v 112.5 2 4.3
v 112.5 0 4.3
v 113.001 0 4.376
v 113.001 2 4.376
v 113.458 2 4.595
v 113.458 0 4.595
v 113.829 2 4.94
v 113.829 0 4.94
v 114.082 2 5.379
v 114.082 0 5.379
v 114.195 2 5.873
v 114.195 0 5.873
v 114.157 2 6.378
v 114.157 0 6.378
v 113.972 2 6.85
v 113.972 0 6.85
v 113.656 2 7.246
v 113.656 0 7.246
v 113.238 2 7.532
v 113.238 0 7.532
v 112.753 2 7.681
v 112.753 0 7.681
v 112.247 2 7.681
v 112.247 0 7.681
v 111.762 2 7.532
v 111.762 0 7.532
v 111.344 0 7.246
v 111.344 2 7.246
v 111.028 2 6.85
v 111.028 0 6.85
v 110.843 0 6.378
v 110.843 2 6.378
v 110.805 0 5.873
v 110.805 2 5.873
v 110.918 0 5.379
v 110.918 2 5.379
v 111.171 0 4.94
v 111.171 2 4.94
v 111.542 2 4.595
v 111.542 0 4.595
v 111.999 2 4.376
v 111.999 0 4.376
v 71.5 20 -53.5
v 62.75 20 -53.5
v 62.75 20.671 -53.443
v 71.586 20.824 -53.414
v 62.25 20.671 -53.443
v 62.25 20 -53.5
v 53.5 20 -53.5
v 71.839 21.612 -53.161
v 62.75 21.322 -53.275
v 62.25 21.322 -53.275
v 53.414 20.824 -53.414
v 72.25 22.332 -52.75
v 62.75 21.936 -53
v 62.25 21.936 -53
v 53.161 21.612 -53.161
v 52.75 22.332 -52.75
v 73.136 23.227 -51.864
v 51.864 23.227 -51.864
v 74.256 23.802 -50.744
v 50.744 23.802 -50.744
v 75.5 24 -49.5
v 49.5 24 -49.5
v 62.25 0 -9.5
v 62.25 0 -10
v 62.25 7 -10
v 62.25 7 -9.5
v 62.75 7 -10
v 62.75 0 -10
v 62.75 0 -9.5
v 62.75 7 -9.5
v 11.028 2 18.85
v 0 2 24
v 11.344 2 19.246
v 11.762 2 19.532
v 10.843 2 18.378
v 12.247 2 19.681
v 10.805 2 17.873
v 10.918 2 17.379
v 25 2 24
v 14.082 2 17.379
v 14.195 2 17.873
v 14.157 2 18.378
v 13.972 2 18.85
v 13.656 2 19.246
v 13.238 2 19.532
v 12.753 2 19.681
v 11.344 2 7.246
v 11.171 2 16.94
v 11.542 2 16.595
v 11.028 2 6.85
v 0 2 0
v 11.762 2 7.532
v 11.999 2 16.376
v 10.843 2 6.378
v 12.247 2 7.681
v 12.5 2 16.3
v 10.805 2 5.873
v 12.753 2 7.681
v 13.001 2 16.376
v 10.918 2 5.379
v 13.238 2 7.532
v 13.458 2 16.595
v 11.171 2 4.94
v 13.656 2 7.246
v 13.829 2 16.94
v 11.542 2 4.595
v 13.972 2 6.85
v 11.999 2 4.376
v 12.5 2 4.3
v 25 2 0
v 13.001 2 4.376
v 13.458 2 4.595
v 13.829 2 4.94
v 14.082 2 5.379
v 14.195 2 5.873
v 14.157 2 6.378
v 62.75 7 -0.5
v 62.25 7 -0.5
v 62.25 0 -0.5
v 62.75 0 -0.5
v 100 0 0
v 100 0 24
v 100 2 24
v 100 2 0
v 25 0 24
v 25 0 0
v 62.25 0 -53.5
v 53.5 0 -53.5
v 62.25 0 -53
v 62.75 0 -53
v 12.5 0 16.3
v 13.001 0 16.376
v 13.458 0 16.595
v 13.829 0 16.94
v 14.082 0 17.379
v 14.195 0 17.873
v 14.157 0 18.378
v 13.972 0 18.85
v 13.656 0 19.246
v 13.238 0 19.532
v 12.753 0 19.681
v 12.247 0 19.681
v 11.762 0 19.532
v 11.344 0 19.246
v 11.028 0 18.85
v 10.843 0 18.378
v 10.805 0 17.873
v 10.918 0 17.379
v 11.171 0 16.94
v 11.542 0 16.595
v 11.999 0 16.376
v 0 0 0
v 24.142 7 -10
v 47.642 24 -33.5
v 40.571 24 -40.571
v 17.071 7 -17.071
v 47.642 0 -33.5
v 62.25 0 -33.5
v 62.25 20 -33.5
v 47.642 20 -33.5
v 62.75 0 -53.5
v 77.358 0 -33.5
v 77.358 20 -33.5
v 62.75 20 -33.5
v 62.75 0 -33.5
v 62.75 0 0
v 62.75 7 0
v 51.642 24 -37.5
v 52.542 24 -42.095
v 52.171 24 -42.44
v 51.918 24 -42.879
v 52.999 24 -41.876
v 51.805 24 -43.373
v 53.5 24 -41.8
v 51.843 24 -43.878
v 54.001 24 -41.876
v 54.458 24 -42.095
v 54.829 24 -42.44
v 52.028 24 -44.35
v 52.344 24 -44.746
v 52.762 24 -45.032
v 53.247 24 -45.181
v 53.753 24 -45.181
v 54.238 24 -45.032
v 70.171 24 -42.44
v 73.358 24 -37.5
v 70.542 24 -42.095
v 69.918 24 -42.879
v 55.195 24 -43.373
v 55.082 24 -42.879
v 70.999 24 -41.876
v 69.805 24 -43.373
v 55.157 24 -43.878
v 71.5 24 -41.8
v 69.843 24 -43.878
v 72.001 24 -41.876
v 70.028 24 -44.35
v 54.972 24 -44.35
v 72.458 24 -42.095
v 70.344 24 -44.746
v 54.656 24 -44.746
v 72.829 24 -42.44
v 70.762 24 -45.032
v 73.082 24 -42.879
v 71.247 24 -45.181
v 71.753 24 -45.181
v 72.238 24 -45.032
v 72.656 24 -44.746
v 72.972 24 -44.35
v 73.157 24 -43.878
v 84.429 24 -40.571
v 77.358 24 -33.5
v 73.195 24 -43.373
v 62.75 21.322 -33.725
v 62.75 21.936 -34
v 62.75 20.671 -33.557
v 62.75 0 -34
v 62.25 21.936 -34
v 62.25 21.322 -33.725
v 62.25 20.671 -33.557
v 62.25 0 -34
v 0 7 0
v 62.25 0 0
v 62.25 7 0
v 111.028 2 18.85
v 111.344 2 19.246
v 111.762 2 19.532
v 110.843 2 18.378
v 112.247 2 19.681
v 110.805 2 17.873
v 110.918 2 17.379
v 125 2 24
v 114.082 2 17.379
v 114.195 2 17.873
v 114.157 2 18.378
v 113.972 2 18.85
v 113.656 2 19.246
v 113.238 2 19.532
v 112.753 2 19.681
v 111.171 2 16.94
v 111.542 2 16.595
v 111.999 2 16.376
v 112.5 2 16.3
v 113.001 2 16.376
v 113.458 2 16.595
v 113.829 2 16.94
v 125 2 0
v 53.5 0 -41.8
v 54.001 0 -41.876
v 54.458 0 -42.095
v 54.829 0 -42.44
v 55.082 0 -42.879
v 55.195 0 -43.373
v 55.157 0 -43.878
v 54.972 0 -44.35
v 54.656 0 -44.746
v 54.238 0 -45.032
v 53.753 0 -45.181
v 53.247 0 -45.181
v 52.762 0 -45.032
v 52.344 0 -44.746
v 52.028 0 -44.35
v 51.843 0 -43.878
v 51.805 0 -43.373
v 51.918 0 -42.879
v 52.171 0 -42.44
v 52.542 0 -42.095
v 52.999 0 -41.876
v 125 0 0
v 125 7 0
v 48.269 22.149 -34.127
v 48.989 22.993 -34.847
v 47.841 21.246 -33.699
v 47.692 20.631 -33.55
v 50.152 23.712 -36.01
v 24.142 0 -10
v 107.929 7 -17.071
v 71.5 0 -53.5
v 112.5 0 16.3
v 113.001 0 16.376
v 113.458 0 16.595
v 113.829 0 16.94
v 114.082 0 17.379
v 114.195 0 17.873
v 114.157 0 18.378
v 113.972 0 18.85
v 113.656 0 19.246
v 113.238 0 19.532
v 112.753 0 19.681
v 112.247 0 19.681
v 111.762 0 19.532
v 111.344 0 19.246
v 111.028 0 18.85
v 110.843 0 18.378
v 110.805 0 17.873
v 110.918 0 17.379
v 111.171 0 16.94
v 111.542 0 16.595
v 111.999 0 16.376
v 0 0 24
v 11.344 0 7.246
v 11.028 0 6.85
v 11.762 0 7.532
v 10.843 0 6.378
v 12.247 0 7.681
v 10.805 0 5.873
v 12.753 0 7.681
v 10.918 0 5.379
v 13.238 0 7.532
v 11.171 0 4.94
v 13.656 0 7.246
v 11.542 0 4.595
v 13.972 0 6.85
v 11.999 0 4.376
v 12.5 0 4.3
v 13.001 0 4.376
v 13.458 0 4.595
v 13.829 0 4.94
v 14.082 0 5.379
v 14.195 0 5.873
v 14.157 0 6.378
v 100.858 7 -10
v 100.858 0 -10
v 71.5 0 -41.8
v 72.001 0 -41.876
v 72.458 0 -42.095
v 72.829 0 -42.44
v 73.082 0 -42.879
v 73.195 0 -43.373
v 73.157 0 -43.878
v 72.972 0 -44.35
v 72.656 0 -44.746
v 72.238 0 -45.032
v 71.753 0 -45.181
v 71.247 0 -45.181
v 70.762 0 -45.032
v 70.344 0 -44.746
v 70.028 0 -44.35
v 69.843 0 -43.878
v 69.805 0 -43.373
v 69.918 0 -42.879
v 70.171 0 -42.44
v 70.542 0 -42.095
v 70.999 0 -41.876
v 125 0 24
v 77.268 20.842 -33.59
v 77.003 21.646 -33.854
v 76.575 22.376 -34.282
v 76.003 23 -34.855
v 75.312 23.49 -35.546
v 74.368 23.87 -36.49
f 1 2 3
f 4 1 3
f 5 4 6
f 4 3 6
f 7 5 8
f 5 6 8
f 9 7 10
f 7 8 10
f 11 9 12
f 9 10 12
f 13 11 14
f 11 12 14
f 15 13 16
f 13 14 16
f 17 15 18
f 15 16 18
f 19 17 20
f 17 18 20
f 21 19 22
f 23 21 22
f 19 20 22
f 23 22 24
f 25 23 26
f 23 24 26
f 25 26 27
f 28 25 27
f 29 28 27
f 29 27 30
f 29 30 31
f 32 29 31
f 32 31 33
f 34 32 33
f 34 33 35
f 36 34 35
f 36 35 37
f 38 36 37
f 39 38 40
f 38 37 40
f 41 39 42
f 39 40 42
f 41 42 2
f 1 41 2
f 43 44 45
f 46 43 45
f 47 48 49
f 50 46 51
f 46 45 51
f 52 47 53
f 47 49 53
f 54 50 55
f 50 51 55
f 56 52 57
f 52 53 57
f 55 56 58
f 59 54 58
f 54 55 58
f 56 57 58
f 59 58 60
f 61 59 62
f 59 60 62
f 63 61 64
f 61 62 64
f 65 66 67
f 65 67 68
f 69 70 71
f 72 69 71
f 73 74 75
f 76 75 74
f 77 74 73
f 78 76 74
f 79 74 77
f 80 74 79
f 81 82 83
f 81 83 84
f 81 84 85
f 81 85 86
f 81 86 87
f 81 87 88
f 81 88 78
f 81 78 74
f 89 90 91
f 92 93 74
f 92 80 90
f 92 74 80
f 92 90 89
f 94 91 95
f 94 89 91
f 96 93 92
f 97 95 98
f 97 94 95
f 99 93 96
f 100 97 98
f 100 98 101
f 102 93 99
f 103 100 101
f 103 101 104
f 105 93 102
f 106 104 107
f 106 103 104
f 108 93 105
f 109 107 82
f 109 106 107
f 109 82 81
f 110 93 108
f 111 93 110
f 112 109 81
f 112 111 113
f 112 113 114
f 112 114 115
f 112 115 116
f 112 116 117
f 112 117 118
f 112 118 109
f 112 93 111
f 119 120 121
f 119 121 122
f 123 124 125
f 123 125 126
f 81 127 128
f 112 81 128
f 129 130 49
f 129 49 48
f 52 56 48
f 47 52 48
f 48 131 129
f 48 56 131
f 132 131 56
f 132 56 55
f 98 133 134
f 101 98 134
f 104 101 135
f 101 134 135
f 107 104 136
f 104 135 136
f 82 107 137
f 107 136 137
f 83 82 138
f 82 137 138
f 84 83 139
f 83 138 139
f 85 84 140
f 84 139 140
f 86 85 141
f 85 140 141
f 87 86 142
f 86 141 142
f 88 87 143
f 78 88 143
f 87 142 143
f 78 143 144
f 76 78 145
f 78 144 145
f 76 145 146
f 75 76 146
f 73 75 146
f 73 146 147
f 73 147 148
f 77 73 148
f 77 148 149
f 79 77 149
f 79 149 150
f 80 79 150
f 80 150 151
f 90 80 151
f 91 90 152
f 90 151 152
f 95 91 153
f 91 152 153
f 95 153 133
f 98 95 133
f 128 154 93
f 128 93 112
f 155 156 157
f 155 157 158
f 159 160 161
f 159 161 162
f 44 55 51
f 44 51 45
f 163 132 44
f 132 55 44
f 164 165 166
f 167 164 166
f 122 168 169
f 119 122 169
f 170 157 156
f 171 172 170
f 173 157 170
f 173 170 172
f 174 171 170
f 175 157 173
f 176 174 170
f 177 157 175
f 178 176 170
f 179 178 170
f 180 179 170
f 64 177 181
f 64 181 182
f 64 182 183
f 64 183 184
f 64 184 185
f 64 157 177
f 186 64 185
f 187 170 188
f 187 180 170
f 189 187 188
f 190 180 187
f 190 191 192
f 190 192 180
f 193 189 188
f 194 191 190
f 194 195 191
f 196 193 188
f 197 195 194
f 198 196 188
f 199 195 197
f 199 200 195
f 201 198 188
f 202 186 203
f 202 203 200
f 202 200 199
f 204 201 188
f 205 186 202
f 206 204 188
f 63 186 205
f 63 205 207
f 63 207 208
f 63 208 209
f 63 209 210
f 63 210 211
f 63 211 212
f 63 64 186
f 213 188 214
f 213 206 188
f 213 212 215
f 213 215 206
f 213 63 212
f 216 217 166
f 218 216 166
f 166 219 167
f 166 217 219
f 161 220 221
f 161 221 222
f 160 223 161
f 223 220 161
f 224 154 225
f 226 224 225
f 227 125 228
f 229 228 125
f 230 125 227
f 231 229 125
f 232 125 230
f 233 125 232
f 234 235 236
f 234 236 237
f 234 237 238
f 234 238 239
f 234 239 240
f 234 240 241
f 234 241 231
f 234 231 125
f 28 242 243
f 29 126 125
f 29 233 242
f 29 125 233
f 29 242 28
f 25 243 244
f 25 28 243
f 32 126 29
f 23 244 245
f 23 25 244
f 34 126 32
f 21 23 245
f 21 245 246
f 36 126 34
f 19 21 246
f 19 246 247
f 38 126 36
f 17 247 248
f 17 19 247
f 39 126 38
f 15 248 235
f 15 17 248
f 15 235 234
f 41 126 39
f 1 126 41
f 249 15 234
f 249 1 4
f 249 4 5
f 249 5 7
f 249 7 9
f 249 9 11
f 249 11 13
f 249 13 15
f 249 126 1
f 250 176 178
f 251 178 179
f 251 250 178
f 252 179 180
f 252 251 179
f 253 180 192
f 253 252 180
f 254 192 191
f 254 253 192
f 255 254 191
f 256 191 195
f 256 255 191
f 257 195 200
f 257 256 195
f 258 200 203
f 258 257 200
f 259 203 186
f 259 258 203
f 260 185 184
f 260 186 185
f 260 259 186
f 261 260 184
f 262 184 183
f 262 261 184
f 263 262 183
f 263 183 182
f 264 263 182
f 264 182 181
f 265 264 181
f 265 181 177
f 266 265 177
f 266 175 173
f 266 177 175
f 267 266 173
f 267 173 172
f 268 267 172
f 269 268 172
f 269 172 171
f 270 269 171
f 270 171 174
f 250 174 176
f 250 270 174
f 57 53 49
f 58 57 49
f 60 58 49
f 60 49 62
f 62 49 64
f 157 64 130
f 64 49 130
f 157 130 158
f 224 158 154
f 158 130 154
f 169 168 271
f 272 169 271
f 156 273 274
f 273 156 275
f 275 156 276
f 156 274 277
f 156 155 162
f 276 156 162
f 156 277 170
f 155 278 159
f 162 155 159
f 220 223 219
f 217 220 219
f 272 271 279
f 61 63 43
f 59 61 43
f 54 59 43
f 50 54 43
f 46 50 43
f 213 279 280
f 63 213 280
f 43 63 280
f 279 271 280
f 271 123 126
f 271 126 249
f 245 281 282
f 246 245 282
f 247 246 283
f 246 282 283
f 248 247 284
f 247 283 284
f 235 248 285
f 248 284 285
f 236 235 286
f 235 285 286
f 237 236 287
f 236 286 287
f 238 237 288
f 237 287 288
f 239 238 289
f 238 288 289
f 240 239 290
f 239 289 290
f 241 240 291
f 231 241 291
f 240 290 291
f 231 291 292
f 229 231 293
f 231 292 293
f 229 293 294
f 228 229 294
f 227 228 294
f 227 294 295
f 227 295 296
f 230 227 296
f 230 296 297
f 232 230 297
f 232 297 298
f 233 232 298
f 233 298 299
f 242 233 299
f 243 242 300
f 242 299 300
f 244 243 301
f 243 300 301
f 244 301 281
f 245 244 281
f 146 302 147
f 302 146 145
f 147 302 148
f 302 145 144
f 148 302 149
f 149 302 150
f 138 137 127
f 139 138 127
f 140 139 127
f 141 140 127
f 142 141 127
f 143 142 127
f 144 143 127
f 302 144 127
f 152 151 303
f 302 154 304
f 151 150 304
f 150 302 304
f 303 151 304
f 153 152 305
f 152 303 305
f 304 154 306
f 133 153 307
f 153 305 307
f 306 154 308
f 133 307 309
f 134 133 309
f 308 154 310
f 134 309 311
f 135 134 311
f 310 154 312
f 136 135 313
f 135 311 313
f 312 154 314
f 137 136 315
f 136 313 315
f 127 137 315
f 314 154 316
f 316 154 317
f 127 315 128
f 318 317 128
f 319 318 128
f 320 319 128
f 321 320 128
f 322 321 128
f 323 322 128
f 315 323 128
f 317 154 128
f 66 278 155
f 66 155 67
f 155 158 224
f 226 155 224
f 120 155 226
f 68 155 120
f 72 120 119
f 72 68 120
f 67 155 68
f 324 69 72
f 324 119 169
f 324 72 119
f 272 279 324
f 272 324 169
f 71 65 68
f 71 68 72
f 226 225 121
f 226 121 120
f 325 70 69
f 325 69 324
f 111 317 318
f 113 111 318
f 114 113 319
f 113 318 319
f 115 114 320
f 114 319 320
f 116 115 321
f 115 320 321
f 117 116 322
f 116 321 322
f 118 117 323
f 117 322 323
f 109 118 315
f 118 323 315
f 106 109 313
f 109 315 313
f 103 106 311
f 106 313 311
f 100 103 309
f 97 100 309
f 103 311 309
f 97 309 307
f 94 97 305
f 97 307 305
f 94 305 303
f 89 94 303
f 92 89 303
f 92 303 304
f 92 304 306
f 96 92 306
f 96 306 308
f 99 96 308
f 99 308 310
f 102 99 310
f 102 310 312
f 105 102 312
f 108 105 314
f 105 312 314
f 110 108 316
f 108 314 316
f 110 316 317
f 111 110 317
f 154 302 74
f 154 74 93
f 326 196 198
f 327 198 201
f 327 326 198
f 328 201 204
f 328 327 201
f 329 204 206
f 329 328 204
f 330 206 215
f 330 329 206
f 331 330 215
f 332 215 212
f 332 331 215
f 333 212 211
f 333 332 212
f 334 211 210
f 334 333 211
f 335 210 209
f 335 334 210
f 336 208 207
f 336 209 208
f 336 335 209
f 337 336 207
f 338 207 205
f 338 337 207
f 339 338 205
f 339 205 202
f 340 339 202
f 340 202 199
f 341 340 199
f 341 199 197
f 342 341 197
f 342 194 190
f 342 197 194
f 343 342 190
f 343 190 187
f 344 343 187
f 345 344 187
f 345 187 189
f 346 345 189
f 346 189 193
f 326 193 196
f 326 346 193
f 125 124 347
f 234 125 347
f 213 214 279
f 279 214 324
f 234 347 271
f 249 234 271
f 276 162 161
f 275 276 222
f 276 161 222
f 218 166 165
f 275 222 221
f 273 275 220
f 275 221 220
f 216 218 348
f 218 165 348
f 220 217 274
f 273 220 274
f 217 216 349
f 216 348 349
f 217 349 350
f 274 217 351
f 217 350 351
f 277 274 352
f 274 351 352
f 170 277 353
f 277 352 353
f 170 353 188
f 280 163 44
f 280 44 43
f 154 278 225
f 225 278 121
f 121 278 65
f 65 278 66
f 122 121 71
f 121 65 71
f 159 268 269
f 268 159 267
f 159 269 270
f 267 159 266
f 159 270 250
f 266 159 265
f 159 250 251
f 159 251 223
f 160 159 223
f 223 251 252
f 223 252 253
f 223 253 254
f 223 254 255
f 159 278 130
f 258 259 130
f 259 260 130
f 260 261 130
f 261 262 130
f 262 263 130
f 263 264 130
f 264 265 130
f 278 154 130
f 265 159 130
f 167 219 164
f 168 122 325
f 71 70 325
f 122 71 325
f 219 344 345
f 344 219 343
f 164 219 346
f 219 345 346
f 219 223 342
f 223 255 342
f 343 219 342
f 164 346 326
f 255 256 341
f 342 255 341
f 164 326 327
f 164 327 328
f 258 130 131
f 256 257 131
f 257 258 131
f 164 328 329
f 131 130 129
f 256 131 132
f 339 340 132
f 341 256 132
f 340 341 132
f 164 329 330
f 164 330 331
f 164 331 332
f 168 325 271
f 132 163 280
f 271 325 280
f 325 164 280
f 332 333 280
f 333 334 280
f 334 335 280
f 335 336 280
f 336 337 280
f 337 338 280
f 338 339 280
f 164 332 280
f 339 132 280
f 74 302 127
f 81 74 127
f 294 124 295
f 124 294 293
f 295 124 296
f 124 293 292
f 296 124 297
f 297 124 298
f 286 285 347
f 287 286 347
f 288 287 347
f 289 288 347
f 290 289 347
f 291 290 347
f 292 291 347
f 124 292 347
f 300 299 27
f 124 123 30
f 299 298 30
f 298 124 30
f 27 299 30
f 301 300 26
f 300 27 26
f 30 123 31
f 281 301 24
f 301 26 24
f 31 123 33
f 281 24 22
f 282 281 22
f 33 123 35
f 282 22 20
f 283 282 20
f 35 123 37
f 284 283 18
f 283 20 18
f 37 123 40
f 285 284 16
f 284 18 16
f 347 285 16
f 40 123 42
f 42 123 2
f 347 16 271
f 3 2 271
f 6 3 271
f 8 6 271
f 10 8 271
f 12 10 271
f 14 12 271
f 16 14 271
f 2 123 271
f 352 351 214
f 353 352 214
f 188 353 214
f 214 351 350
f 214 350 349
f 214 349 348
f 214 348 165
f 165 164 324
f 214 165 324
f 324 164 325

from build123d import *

# Parameters (mm, degrees)
BEARING_MOUNTS_W             = 25
BEARING_MOUNTS_H             = 24
BEARING_MOUNT_PLATES_DEPTH   = 2
BEARING_MOUNT_PLATES_2_DEPTH = 2
BRIDGE_DEPTH                 = 7
M3_BEARING_HOLES_R           = 1.7
BEARING_MOUNT_HOLES_DEPTH    = 2
SKETCH7_W                    = 0.5
SKETCH7_H                    = 7
ALIGNMENT_HELPER_1_DEPTH     = 0.5
SKETCH24_W                   = 0.5
SKETCH24_H                   = 1
ALIGNMENT_HELPER_1B_DEPTH    = 10
BELT_MOUNT_DEPTH             = 17
SKETCH8_R                    = 1.7
BELT_MOUNT_HOLES_DEPTH       = 139.069728761
ANGLE_LEFT_DEPTH             = 17
ANGLE_LEFT_CUT_DEPTH         = 30
ANGLE_RIGHT_DEPTH            = 17
ANGLE_RIGHT_CUT_DEPTH        = 30
SKETCH23_W                   = 0.5
SKETCH23_H                   = 1
ALIGNMENT_HELPER_2_DEPTH     = 139.069728761
FILLET5_R                    = 4
FILLET2_R                    = 4
SKETCH25_W                   = 0.5
SKETCH25_H                   = 1
ALIGNMENT_HELPER_2B_DEPTH    = 139.069728761


with BuildPart() as part:
    # Bearing Mounts → Bearing Mount Plates (new body)
    with BuildSketch(Plane(origin=(0, 0, 0), x_dir=(1, 0, 0), z_dir=(0, 1, 0))):
        with Locations((12.5, -12)):
            Rectangle(BEARING_MOUNTS_W, BEARING_MOUNTS_H)
    extrude(amount=BEARING_MOUNT_PLATES_DEPTH)


with BuildPart() as body_2:
    # Bearing Mounts → Bearing Mount Plates 2 (new body)
    with BuildSketch(Plane(origin=(0, 0, 0), x_dir=(1, 0, 0), z_dir=(0, 1, 0))):
        with Locations((112.5, -12)):
            Rectangle(BEARING_MOUNTS_W, BEARING_MOUNTS_H)
    extrude(amount=BEARING_MOUNT_PLATES_2_DEPTH)


with BuildPart() as body_3:
    # Triangle → Bridge (new body)
    with BuildSketch(Plane(origin=(0, 0, 0), x_dir=(1, 0, 0), z_dir=(0, 1, 0))):
        Polygon((0, 0), (125, 0), (71.5, 53.5), (53.5, 53.5), align=None)
        Polygon((24.142135624, 10), (100.857864376, 10), (77.357864376, 33.5), (47.642135624, 33.5), align=None, mode=Mode.SUBTRACT)
    extrude(amount=BRIDGE_DEPTH)

    # Sketch7 → Alignment helper 1 (cut)
    with BuildSketch(Plane.XY):
        with Locations((62.5, 3.5)):
            Rectangle(SKETCH7_W, SKETCH7_H)
    extrude(amount=-ALIGNMENT_HELPER_1_DEPTH, mode=Mode.SUBTRACT)

    # Sketch24 → Alignment helper 1b (cut)
    with BuildSketch(Plane.XZ):
        with Locations((62.5, -10)):
            Rectangle(SKETCH24_W, SKETCH24_H)
    extrude(amount=-ALIGNMENT_HELPER_1B_DEPTH, mode=Mode.SUBTRACT)

    # Sketch9 → Belt Mount (add)
    with BuildSketch(Plane(origin=(0, 7, 0), x_dir=(1, 0, 0), z_dir=(0, 1, 0))):
        Polygon((33.5, 33.5), (53.5, 53.5), (71.5, 53.5), (91.5, 33.5), align=None)
    extrude(amount=BELT_MOUNT_DEPTH)

    # Sketch8 → Belt Mount Holes (cut, through all)
    with BuildSketch(Plane(origin=(0, 0, 0), x_dir=(1, 0, 0), z_dir=(0, 1, 0))):
        with Locations(Location((53.5, 43.5, 0), (0, 0, 270))):
            Circle(SKETCH8_R)
        with Locations(Location((71.5, 43.5, 0), (0, 0, 270))):
            Circle(SKETCH8_R)
    extrude(amount=BELT_MOUNT_HOLES_DEPTH, mode=Mode.SUBTRACT)

    # Sketch14 → Angle Left (add)
    with BuildSketch(Plane(origin=(0, 7, 0), x_dir=(1, 0, 0), z_dir=(0, 1, 0))):
        Polygon((24.142135624, 10), (47.642135624, 33.5), (33.5, 33.5), (10, 10), align=None)
    extrude(amount=ANGLE_LEFT_DEPTH)

    # Sketch17 → Angle Left Cut (cut)
    with BuildSketch(Plane(origin=(7.071067812, 0, 7.071067812), x_dir=(0.7071067811865369, 0, -0.7071067811865581), z_dir=(0.7071067811865581, 0, 0.7071067811865369))):
        Polygon((57.376154339, 24), (24.142135624, 7), (10, 7), (10, 24), (24.142135624, 24), align=None)
    extrude(amount=-ANGLE_LEFT_CUT_DEPTH, mode=Mode.SUBTRACT)

    # Sketch20 → Angle Right (add)
    with BuildSketch(Plane(origin=(0, 7, 0), x_dir=(1, 0, 0), z_dir=(0, 1, 0))):
        Polygon((100.857864376, 10), (115, 10), (91.5, 33.5), (77.357864376, 33.5), align=None)
    extrude(amount=ANGLE_RIGHT_DEPTH)

    # Sketch21 → Angle Right Cut (cut)
    with BuildSketch(Plane(origin=(55.428932188, 0, -55.428932188), x_dir=(0.7071067811865511, 0, 0.707106781186544), z_dir=(-0.707106781186544, 0, 0.7071067811865511))):
        Polygon((31.012193309, 24), (64.246212025, 7), (78.388347648, 7), (78.388347648, 24), (64.246212025, 24), align=None)
    extrude(amount=-ANGLE_RIGHT_CUT_DEPTH, mode=Mode.SUBTRACT)

    # Sketch23 → Alignment helper 2 (cut, through all)
    with BuildSketch(Plane(origin=(0, 0, 0), x_dir=(1, 0, 0), z_dir=(0, 1, 0))):
        with Locations((62.5, 53.5)):
            Rectangle(SKETCH23_W, SKETCH23_H)
    extrude(amount=ALIGNMENT_HELPER_2_DEPTH, mode=Mode.SUBTRACT)

    # Fillet5
    # the kernel refuses this fillet: 4 mm, written as the material it takes off along each edge
    with BuildSketch(Plane(origin=(87.357864376, 24, -33.5), x_dir=(0, -1, 0), z_dir=(-1, 0, 0))) as fillet5_piece_1_section:
        with BuildLine():
            CenterArc((FILLET5_R, -FILLET5_R), FILLET5_R, 90, 90)
            Line((0, -FILLET5_R), (0, 0))
            Line((0, 0), (FILLET5_R, 0))
        make_face()
    fillet5_piece_1 = extrude(amount=49.715728753, mode=Mode.PRIVATE)
    fillet5_piece_1 = split(fillet5_piece_1, bisect_by=Plane(origin=(55.497209135, 23.062933131, -41.355073512), z_dir=(0.7071067811865583, 0, 0.7071067811865369)), keep=Keep.TOP, mode=Mode.PRIVATE)
    fillet5_piece_1 = split(fillet5_piece_1, bisect_by=Plane(origin=(69.502790865, 23.062933131, -41.355073512), z_dir=(-0.7071067811865436, 0, 0.7071067811865515)), keep=Keep.TOP, mode=Mode.PRIVATE)
    add(fillet5_piece_1, mode=Mode.SUBTRACT)

    # Fillet2
    # the kernel refuses this fillet: 4 mm, written as the material it takes off along each edge
    with BuildSketch(Plane(origin=(43.5, 24, -53.5), x_dir=(0, -1, 0), z_dir=(1, 0, 0)), Plane(origin=(52.75, 24, -53.5), x_dir=(0, -1, 0), z_dir=(1, 0, 0))) as fillet2_piece_1:
        with BuildLine():
            CenterArc((FILLET2_R, -FILLET2_R), FILLET2_R, 90, 90)
            Line((0, -FILLET2_R), (0, 0))
            Line((0, 0), (FILLET2_R, 0))
        make_face()
    extrude(amount=28.75, mode=Mode.SUBTRACT)

    # Sketch25 → Alignment helper 2b (cut, through all)
    with BuildSketch(Plane.XZ):
        with Locations((62.5, -33.5)):
            Rectangle(SKETCH25_W, SKETCH25_H)
    extrude(amount=-ALIGNMENT_HELPER_2B_DEPTH, mode=Mode.SUBTRACT)


with BuildPart() as bearing_mount_holes_tool:
    # M3 Bearing Holes → Bearing Mount Holes (new body)
    with BuildSketch(Plane.XZ):
        with Locations(Location((112.5, 6, 0), (0, 0, 270))):
            Circle(M3_BEARING_HOLES_R)
        with Locations(Location((112.5, 18, 0), (0, 0, 270))):
            Circle(M3_BEARING_HOLES_R)
        with Locations(Location((12.5, 6, 0), (0, 0, 270))):
            Circle(M3_BEARING_HOLES_R)
        with Locations(Location((12.5, 18, 0), (0, 0, 270))):
            Circle(M3_BEARING_HOLES_R)
    extrude(amount=-BEARING_MOUNT_HOLES_DEPTH)


with BuildPart() as part_1:
    add(part.part)

    # Bearing Mount Holes: cut by bearing_mount_holes_tool
    add(bearing_mount_holes_tool.part, mode=Mode.SUBTRACT)


with BuildPart() as body_2_1:
    add(body_2.part)

    # Bearing Mount Holes: cut by bearing_mount_holes_tool
    add(bearing_mount_holes_tool.part, mode=Mode.SUBTRACT)


solid = Compound([body_3.part, part_1.part, body_2_1.part])
